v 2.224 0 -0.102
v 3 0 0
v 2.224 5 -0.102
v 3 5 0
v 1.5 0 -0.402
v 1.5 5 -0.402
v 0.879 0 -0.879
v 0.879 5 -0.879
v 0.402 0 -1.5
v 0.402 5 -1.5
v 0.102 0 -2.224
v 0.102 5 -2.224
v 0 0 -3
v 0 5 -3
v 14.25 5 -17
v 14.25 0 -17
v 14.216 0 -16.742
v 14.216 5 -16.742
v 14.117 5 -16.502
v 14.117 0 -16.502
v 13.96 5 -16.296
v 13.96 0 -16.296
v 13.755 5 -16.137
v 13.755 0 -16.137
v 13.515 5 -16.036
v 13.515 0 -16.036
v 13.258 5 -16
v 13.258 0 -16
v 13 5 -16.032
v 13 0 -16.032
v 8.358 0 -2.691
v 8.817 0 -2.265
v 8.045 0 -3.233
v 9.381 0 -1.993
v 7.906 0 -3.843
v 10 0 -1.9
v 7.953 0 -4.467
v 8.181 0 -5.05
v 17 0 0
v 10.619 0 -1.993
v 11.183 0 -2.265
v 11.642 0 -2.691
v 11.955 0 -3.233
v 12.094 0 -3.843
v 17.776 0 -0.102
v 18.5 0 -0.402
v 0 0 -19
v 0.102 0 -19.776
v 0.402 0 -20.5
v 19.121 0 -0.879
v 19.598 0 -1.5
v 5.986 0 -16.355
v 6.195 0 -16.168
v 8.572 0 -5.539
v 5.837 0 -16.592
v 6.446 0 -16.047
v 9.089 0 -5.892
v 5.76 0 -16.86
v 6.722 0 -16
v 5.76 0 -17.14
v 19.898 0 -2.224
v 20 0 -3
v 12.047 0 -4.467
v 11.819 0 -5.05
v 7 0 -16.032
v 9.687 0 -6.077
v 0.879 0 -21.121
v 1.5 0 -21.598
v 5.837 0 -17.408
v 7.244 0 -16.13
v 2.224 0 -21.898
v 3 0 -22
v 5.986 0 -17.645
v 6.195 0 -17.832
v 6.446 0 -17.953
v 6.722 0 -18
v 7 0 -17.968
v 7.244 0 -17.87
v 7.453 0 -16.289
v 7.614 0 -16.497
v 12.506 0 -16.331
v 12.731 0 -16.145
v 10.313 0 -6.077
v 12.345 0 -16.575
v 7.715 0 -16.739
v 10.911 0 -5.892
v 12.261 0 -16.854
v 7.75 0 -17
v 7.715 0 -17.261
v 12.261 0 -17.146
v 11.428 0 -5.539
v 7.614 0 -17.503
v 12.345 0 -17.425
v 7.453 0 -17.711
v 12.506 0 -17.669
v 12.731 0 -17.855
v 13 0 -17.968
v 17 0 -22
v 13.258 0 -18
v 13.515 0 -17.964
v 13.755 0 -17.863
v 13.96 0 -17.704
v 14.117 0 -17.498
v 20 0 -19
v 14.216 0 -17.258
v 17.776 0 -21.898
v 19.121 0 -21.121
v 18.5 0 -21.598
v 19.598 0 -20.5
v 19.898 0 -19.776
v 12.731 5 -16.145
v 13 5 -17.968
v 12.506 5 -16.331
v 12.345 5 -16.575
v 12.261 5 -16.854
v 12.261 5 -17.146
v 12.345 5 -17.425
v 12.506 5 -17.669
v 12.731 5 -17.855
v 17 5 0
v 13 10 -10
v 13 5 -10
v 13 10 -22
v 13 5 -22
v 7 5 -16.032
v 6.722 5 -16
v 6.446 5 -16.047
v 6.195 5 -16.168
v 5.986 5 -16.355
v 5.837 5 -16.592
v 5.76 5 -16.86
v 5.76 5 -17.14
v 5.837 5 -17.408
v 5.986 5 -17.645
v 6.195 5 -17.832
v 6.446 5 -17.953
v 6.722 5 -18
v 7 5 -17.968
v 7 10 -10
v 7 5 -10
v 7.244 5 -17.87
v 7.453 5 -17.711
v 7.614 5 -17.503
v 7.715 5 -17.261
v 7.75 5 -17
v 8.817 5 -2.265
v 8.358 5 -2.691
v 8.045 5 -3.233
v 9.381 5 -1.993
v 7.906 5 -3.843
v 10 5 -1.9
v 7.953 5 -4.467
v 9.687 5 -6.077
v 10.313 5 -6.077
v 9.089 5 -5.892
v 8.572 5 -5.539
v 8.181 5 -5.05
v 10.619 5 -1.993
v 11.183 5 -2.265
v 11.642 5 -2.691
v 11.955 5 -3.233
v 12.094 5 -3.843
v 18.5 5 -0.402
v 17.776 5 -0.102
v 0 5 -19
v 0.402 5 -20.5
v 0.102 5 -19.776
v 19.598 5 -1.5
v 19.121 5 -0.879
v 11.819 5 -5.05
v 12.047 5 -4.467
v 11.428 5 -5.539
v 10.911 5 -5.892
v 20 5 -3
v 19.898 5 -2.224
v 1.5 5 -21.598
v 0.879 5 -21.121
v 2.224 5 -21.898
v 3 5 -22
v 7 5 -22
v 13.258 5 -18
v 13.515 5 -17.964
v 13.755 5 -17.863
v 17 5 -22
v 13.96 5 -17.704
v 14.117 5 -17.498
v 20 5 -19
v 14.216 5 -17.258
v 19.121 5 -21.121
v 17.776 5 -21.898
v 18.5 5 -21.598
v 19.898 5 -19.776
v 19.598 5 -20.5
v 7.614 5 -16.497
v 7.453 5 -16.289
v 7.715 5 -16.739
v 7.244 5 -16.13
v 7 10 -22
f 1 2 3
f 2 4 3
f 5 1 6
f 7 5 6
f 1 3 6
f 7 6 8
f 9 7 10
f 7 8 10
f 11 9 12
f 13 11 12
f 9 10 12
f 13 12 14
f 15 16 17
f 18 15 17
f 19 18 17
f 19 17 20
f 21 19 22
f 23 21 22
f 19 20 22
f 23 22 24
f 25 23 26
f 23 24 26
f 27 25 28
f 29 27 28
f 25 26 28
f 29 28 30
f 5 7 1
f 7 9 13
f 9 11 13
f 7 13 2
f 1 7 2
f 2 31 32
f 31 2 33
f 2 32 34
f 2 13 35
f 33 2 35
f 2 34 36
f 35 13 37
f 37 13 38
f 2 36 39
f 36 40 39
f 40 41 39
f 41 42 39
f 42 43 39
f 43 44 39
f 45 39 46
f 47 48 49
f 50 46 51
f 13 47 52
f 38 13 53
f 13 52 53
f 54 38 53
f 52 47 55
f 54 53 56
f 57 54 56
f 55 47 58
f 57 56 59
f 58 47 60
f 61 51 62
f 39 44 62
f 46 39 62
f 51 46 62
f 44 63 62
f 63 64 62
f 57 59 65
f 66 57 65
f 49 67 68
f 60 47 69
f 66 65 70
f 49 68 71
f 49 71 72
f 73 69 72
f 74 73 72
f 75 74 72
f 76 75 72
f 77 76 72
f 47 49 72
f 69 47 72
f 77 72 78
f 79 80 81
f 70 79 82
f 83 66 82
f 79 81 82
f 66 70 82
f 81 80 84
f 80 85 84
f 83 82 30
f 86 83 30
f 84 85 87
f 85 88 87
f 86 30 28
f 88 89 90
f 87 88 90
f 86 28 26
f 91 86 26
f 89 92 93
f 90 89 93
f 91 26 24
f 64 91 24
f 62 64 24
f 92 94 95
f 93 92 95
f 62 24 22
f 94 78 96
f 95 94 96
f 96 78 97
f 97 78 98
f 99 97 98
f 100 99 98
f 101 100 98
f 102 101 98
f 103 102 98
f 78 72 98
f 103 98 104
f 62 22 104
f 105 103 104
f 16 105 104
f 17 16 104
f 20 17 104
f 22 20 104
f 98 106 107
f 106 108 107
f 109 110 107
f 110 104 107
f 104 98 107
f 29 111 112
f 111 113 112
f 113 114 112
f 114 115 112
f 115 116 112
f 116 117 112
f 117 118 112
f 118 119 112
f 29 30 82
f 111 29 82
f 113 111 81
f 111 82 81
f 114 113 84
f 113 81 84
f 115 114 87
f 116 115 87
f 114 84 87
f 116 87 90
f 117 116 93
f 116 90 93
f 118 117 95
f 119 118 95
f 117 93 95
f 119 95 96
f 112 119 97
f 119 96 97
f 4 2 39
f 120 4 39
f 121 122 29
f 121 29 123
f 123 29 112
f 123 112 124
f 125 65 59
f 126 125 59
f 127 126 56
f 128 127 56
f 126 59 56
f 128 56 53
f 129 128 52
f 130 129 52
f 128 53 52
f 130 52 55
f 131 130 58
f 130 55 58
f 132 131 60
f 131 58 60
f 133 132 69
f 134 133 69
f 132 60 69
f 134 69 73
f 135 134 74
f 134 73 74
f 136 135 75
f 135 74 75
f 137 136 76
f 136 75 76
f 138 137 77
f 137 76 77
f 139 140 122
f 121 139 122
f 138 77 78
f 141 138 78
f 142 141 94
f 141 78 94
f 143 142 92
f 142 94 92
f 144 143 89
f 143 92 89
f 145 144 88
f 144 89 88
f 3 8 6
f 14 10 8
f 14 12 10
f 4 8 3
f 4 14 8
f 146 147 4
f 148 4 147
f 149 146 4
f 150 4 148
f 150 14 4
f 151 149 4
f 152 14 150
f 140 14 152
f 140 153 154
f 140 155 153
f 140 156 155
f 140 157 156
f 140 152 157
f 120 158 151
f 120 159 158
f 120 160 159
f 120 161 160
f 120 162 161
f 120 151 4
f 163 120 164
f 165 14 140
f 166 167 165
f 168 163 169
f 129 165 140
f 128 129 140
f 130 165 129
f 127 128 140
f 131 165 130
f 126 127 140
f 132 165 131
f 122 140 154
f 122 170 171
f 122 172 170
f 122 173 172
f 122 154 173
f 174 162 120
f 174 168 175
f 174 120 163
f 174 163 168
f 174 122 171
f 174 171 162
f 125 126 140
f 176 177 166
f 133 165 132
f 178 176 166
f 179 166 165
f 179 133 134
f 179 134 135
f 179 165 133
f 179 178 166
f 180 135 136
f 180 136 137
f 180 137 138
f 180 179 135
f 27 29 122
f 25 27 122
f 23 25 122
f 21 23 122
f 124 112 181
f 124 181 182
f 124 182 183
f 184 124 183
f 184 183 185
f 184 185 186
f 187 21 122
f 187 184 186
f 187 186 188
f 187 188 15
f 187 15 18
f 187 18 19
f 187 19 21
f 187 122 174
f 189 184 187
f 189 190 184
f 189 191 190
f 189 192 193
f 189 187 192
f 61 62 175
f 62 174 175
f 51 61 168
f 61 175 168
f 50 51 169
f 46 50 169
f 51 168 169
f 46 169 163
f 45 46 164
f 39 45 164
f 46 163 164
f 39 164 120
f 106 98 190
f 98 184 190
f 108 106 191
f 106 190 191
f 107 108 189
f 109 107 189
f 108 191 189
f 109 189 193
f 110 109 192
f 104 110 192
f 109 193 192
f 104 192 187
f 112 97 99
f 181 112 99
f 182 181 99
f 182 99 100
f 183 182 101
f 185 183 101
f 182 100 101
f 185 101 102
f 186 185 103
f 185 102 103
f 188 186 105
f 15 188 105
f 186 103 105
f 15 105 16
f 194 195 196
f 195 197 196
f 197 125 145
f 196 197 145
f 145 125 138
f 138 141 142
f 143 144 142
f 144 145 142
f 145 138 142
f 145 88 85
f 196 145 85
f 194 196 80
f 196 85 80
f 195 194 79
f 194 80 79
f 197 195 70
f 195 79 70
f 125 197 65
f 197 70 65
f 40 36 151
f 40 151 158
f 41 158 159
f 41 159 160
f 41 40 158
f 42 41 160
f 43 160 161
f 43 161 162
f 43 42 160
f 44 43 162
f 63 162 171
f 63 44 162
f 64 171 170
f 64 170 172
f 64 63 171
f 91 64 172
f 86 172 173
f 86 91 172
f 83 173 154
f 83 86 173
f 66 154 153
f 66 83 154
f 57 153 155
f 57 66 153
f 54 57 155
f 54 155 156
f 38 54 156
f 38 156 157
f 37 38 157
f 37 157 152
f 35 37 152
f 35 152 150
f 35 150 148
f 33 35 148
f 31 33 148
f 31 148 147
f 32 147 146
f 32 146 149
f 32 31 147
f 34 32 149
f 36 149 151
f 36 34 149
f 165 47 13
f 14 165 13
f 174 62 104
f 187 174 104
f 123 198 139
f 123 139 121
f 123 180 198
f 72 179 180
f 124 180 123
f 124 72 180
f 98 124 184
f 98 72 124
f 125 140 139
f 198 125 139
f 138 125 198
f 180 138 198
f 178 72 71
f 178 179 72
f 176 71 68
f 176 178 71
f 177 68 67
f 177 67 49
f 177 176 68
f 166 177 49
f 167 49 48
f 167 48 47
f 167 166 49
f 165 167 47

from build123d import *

# Parameters (mm, degrees)
SKETCH_1_R      = 2.1
EXTRUDE_1_DEPTH = 5
EXTRUDE_START   = 5
SKETCH_1_3_W    = 6
SKETCH_1_3_H    = 12
EXTRUDE_2_DEPTH = 5
FILLET_2_R      = 3


with BuildPart() as part:
    # 草图1 → 凸台-拉伸1 (new body)
    # profile 1 of 2: a face of its own
    with BuildSketch(Plane(origin=(0, 0, 0), x_dir=(1, 0, 0), z_dir=(0, 1, 0))):
        with BuildLine():
            Line((0, 22), (0, 0))
            Line((0, 0), (20, 0))
            Line((20, 0), (20, 22))
            Line((20, 22), (13, 22))
            Line((13, 22), (13, 17.968245837))
            ThreePointArc((13, 17.968245837), (13.862372436, 17.790569415), (14.25, 17))
            ThreePointArc((14.25, 17), (13.862372436, 16.209430585), (13, 16.031754163))
            Line((13, 16.031754163), (13, 10))
            Line((13, 10), (7, 10))
            Line((7, 10), (7, 16.031754163))
            ThreePointArc((7, 16.031754163), (5.75, 17), (7, 17.968245837))
            Line((7, 17.968245837), (7, 22))
            Line((7, 22), (0, 22))
        make_face()
        with Locations(Location((10, 4, 0), (0, 0, 270))):
            Circle(SKETCH_1_R, mode=Mode.SUBTRACT)
    # profile 2 of 2: a face of its own
    with BuildSketch(Plane(origin=(0, 0, 0), x_dir=(1, 0, 0), z_dir=(0, 1, 0))):
        with BuildLine():
            Line((13, 22), (7, 22))
            Line((7, 22), (7, 17.968245837))
            ThreePointArc((7, 17.968245837), (7.540569415, 17.612372436), (7.75, 17))
            ThreePointArc((7.75, 17), (7.540569415, 16.387627564), (7, 16.031754163))
            Line((7, 16.031754163), (7, 10))
            Line((7, 10), (13, 10))
            Line((13, 10), (13, 16.031754163))
            ThreePointArc((13, 16.031754163), (12.25, 17), (13, 17.968245837))
            Line((13, 17.968245837), (13, 22))
        make_face()
    extrude(amount=EXTRUDE_1_DEPTH)

    # 草图1<3> → 凸台-拉伸2 (add)
    with BuildSketch(Plane(origin=(0, 0, 0), x_dir=(1, 0, 0), z_dir=(0, 1, 0)).offset(EXTRUDE_START)):
        with Locations((10, 16)):
            Rectangle(SKETCH_1_3_W, SKETCH_1_3_H)
    extrude(amount=EXTRUDE_2_DEPTH)

    # 圆角2
    fillet_2_edges = [part.edges().sort_by_distance(p)[0] for p in [
        (20, 2.5, 0),
        (0, 2.5, 0),
        (0, 2.5, -22),
        (20, 2.5, -22),
    ]]
    fillet(fillet_2_edges, radius=FILLET_2_R)


solid = part.part
